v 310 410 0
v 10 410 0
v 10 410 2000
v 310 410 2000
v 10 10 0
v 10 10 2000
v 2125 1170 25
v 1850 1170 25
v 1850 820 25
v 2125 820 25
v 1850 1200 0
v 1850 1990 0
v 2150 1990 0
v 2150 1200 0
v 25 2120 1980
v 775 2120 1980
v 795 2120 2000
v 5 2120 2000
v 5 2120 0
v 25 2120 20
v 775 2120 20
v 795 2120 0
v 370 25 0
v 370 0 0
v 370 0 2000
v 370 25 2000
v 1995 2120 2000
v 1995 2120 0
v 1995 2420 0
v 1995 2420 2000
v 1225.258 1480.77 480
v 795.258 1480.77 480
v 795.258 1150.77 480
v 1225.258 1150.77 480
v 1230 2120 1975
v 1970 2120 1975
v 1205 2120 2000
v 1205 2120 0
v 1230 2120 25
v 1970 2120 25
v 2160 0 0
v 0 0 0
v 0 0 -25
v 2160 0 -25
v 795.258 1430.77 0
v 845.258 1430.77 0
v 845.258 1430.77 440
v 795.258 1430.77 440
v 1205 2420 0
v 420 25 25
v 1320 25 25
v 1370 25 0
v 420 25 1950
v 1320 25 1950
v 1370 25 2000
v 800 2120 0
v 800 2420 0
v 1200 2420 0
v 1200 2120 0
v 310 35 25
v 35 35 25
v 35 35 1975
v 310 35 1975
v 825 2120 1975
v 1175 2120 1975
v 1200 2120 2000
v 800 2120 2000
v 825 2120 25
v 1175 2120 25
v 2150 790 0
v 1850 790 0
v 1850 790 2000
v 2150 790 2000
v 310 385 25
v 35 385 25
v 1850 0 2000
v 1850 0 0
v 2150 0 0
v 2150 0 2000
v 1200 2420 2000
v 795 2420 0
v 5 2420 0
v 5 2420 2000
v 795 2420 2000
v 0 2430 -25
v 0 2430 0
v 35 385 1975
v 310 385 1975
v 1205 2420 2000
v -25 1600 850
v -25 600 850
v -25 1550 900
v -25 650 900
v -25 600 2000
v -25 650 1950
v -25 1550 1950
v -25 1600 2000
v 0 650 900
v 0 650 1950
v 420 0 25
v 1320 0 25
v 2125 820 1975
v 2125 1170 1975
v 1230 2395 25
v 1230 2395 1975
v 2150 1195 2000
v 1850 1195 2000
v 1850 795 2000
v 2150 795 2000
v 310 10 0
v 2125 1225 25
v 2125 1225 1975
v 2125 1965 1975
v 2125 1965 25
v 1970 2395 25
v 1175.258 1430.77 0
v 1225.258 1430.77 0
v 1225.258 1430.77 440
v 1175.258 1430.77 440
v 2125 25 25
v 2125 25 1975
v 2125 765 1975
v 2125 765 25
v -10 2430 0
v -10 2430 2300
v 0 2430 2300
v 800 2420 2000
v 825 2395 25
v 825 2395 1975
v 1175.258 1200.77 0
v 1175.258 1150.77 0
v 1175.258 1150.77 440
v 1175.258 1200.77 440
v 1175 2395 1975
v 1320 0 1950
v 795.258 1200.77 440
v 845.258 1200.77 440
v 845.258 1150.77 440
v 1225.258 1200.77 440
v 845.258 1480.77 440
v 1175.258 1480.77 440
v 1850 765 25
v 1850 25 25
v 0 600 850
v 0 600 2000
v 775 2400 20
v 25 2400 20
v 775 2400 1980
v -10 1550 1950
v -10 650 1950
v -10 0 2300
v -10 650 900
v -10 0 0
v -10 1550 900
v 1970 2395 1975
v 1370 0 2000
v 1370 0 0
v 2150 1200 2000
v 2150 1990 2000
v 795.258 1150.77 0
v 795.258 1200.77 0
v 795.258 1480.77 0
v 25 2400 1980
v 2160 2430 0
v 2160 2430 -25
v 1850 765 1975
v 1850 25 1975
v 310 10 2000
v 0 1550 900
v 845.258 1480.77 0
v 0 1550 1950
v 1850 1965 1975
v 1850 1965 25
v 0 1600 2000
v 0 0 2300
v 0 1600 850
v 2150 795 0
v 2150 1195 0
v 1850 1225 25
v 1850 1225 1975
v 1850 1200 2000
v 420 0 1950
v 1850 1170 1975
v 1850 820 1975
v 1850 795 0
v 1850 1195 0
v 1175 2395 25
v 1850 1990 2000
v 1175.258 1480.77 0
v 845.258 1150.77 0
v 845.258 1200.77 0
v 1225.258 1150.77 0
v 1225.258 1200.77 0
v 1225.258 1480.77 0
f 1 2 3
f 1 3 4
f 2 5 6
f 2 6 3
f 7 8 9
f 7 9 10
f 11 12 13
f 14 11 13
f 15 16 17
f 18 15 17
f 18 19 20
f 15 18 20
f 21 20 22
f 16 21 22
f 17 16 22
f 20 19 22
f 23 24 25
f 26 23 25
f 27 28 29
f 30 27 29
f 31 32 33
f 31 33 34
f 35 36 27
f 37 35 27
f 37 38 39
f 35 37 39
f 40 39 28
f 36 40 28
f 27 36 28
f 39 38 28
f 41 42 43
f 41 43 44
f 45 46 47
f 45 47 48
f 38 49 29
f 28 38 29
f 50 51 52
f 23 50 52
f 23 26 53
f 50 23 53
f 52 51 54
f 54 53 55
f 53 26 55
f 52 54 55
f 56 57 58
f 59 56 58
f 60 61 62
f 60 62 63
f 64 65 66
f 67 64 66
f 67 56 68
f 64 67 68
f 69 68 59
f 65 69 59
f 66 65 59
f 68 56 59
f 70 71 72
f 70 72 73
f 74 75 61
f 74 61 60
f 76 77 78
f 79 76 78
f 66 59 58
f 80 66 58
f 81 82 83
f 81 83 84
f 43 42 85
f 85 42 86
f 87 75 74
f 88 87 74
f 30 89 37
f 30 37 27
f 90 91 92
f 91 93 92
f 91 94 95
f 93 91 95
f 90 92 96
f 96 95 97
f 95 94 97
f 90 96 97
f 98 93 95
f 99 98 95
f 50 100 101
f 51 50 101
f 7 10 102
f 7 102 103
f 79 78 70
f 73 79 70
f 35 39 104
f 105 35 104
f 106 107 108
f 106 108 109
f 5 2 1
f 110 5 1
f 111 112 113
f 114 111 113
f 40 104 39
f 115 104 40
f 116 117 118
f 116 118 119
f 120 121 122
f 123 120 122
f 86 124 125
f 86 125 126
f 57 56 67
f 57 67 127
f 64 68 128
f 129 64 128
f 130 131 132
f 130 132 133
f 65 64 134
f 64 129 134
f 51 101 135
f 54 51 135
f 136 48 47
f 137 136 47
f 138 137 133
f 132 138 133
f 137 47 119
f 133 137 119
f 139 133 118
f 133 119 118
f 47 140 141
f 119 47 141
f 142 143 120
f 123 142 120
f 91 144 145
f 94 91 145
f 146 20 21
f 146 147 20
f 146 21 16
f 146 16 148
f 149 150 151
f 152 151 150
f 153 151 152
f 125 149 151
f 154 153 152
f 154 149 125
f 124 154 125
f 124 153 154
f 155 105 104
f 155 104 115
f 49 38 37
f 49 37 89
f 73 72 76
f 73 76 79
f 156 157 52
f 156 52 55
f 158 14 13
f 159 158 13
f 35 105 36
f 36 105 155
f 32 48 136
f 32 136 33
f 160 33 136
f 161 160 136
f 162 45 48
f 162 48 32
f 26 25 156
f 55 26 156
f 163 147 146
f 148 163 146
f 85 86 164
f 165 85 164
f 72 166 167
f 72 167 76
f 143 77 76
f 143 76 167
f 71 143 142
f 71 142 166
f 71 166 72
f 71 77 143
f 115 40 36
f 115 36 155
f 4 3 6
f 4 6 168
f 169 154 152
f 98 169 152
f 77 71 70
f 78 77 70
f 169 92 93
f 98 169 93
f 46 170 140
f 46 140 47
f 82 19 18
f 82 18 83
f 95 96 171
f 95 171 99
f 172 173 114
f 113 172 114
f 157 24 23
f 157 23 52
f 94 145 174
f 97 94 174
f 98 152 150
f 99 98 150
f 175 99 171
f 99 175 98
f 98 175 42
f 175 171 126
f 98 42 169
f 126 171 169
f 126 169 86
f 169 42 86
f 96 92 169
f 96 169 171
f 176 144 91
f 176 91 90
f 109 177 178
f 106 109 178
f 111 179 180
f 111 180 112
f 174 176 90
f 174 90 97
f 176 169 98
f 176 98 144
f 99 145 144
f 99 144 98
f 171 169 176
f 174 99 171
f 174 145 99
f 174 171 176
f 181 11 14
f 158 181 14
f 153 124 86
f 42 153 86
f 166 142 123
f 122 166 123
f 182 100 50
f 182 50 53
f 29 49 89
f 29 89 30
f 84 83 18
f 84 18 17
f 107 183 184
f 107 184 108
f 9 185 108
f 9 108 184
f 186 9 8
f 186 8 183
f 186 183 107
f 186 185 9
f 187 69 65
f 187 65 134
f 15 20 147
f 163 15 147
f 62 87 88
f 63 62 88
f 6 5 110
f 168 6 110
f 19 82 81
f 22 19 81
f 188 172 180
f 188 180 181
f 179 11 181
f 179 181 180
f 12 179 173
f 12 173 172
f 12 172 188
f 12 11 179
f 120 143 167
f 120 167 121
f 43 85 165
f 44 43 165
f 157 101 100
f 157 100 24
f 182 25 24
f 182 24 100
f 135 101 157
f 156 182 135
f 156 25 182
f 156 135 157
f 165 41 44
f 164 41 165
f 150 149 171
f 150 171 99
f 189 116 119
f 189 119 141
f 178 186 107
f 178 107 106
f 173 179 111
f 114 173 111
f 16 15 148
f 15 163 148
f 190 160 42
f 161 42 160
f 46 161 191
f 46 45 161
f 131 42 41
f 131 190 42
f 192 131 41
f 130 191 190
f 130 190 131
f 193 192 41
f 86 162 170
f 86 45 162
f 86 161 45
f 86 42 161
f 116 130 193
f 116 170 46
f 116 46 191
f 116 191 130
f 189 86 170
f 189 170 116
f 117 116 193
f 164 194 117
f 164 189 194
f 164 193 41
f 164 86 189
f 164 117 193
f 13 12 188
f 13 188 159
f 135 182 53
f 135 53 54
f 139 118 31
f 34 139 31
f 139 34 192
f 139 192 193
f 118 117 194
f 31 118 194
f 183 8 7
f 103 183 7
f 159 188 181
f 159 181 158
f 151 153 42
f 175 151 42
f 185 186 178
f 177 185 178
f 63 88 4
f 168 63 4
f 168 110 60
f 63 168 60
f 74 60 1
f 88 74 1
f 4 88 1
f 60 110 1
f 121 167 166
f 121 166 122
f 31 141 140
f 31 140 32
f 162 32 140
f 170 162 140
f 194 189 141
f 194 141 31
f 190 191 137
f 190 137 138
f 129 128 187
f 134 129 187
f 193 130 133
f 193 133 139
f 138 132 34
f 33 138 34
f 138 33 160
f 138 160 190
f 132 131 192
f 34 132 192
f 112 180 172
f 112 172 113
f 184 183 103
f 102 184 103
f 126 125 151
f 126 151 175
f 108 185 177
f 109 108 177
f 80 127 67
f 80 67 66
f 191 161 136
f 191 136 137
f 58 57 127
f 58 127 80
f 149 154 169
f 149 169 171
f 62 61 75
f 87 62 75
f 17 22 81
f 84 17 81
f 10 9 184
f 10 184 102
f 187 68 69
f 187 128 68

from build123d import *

# Parameters (mm, degrees)
F3_W      = 790
F3_H      = 300
F4_DEPTH  = 2000
F2_W      = 400
F2_H      = 300
F5_DEPTH  = 2000
F1_W      = 300
F1_H      = 790
F6_DEPTH  = 2000
F7_W      = 300
F7_H      = 400
F8_DEPTH  = 2000
F9_W      = 300
F9_H      = 790
F10_DEPTH = 2000
F11_T     = -20
F12_T     = -25
F13_W     = 300
F13_H     = 400
F14_DEPTH = 2000
F15_T     = -25
F17_W     = 10
F17_H     = 2430
F18_DEPTH = 2300
F16_W     = 1000
F16_H     = 2000
F19_DEPTH = 25
F20_W     = 1000
F20_H     = 1150
F21_DEPTH = 25
F22_W     = 900
F22_H     = 1925
F23_DEPTH = 25
F24_W     = 900
F24_H     = 1050
F25_DEPTH = 25
F26_W     = 790
F26_H     = 300
F27_DEPTH = 2000
F28_T     = -25
F29_T     = -25
F29_2_T   = -25
F29_3_T   = -25
F0_W      = 2160
F0_H      = 2430
F30_DEPTH = 25
F31_W     = 430
F31_H     = 330
F32_DEPTH = 440
F34_DEPTH = 440
F36_W     = 430
F36_H     = 330
F37_DEPTH = 40


with BuildPart() as f4:
    # F3 (on Top) → F4 (new body)
    with BuildSketch(Plane.XY):
        with Locations((400, 2270)):
            Rectangle(F3_W, F3_H)
    extrude(amount=F4_DEPTH)

    # F11
    f11_openings = [f4.faces().sort_by_distance(p)[0] for p in [
        (400, 2120, 1000),
    ]]
    offset(amount=F11_T, openings=f11_openings)


with BuildPart() as f5:
    # F2 (on Top) → F5 (new body)
    with BuildSketch(Plane.XY):
        with Locations((1000, 2270)):
            Rectangle(F2_W, F2_H)
    extrude(amount=F5_DEPTH)

    # F12
    f12_openings = [f5.faces().sort_by_distance(p)[0] for p in [
        (1000, 2120, 1000),
    ]]
    offset(amount=F12_T, openings=f12_openings)


with BuildPart() as f6:
    # F1 (on Top) → F6 (new body)
    with BuildSketch(Plane.XY):
        with Locations((2000, 1595)):
            Rectangle(F1_W, F1_H)
    extrude(amount=F6_DEPTH)

    # F29
    f29_openings = [f6.faces().sort_by_distance(p)[0] for p in [
        (1850, 1595, 1000),
    ]]
    offset(amount=F29_T, openings=f29_openings)


with BuildPart() as f8:
    # F7 (on Top) → F8 (new body)
    with BuildSketch(Plane.XY):
        with Locations((2000, 995)):
            Rectangle(F7_W, F7_H)
    extrude(amount=F8_DEPTH)

    # F29#2
    f29_2_openings = [f8.faces().sort_by_distance(p)[0] for p in [
        (1850, 995, 1000),
    ]]
    offset(amount=F29_2_T, openings=f29_2_openings)


with BuildPart() as f10:
    # F9 (on Top) → F10 (new body)
    with BuildSketch(Plane.XY):
        with Locations((2000, 395)):
            Rectangle(F9_W, F9_H)
    extrude(amount=F10_DEPTH)

    # F29#3
    f29_3_openings = [f10.faces().sort_by_distance(p)[0] for p in [
        (1850, 395, 1000),
    ]]
    offset(amount=F29_3_T, openings=f29_3_openings)


with BuildPart() as f14:
    # F13 (on Top) → F14 (new body)
    with BuildSketch(Plane.XY):
        with Locations((160, 210)):
            Rectangle(F13_W, F13_H)
    extrude(amount=F14_DEPTH)

    # F15
    f15_openings = [f14.faces().sort_by_distance(p)[0] for p in [
        (310, 210, 1000),
    ]]
    offset(amount=F15_T, openings=f15_openings)


with BuildPart() as f18:
    # F17 (on face) → F18 (new body)
    with BuildSketch(Plane.XY):
        with Locations((-5, 1215)):
            Rectangle(F17_W, F17_H)
    extrude(amount=F18_DEPTH)


with BuildPart() as f19:
    # F16 (on Front) → F19 (new body)
    with BuildSketch(Plane.XZ):
        with Locations((870, 1000)):
            Rectangle(F16_W, F16_H)
    extrude(amount=-F19_DEPTH)

    # F22 (on face) → F23 (cut)
    with BuildSketch(Plane.XZ):
        with Locations((870, 987.5)):
            Rectangle(F22_W, F22_H)
    extrude(amount=-F23_DEPTH, mode=Mode.SUBTRACT)


with BuildPart() as f21:
    # F20 (on Right) → F21 (new body)
    with BuildSketch(Plane.YZ):
        with Locations((1100, 1425)):
            Rectangle(F20_W, F20_H)
    extrude(amount=-F21_DEPTH)


with BuildPart() as f25_tool:
    # F24 (on face) → F25 (new body, symmetric)
    with BuildSketch(Plane(origin=(-25, 0, 0), x_dir=(0, -1, 0), z_dir=(-1, 0, 0))):
        with Locations((-1100, 1425)):
            Rectangle(F24_W, F24_H)
    extrude(amount=F25_DEPTH, both=True)


with BuildPart() as f18_1:
    add(f18.part)

    # F25: cut by f25_tool
    add(f25_tool.part, mode=Mode.SUBTRACT)


with BuildPart() as f21_1:
    add(f21.part)

    # F25: cut by f25_tool
    add(f25_tool.part, mode=Mode.SUBTRACT)


with BuildPart() as f27:
    # F26 (on face) → F27 (new body)
    with BuildSketch(Plane.XY):
        with Locations((1600, 2270)):
            Rectangle(F26_W, F26_H)
    extrude(amount=F27_DEPTH)

    # F28
    f28_openings = [f27.faces().sort_by_distance(p)[0] for p in [
        (1600, 2120, 1000),
    ]]
    offset(amount=F28_T, openings=f28_openings)


with BuildPart() as f30:
    # F0 (on Top) → F30 (new body)
    with BuildSketch(Plane.XY):
        with Locations((1080, 1215)):
            Rectangle(F0_W, F0_H)
    extrude(amount=-F30_DEPTH)

    # F31 (on face) → F32 (join)
    with BuildSketch(Plane.XY):
        with Locations((1010.2578735352, 1315.7700681686)):
            Rectangle(F31_W, F31_H)
    extrude(amount=F32_DEPTH)

    # F33 (on face) → F34 (cut)
    with BuildSketch(Plane.XY.offset(440)):
        Polygon((1175.2578735352, 1480.7700681686), (845.2578735352, 1480.7700681686), (845.2578735352, 1430.7700681686), (795.2578735352, 1430.7700681686), (795.2578735352, 1200.7700681686), (845.2578735352, 1200.7700681686), (845.2578735352, 1150.7700681686), (1175.2578735352, 1150.7700681686), (1175.2578735352, 1200.7700681686), (1225.2578735352, 1200.7700681686), (1225.2578735352, 1430.7700681686), (1175.2578735352, 1430.7700681686), align=None)
    extrude(amount=-F34_DEPTH, mode=Mode.SUBTRACT)

    # F36 (on mid) → F37 (join)
    with BuildSketch(Plane.XY.offset(440)):
        with Locations((1010.2578735352, 1315.7700681686)):
            Rectangle(F36_W, F36_H)
    extrude(amount=F37_DEPTH)


solid = Compound([f4.part, f5.part, f6.part, f8.part, f10.part, f14.part, f19.part, f18_1.part, f21_1.part, f27.part, f30.part])
